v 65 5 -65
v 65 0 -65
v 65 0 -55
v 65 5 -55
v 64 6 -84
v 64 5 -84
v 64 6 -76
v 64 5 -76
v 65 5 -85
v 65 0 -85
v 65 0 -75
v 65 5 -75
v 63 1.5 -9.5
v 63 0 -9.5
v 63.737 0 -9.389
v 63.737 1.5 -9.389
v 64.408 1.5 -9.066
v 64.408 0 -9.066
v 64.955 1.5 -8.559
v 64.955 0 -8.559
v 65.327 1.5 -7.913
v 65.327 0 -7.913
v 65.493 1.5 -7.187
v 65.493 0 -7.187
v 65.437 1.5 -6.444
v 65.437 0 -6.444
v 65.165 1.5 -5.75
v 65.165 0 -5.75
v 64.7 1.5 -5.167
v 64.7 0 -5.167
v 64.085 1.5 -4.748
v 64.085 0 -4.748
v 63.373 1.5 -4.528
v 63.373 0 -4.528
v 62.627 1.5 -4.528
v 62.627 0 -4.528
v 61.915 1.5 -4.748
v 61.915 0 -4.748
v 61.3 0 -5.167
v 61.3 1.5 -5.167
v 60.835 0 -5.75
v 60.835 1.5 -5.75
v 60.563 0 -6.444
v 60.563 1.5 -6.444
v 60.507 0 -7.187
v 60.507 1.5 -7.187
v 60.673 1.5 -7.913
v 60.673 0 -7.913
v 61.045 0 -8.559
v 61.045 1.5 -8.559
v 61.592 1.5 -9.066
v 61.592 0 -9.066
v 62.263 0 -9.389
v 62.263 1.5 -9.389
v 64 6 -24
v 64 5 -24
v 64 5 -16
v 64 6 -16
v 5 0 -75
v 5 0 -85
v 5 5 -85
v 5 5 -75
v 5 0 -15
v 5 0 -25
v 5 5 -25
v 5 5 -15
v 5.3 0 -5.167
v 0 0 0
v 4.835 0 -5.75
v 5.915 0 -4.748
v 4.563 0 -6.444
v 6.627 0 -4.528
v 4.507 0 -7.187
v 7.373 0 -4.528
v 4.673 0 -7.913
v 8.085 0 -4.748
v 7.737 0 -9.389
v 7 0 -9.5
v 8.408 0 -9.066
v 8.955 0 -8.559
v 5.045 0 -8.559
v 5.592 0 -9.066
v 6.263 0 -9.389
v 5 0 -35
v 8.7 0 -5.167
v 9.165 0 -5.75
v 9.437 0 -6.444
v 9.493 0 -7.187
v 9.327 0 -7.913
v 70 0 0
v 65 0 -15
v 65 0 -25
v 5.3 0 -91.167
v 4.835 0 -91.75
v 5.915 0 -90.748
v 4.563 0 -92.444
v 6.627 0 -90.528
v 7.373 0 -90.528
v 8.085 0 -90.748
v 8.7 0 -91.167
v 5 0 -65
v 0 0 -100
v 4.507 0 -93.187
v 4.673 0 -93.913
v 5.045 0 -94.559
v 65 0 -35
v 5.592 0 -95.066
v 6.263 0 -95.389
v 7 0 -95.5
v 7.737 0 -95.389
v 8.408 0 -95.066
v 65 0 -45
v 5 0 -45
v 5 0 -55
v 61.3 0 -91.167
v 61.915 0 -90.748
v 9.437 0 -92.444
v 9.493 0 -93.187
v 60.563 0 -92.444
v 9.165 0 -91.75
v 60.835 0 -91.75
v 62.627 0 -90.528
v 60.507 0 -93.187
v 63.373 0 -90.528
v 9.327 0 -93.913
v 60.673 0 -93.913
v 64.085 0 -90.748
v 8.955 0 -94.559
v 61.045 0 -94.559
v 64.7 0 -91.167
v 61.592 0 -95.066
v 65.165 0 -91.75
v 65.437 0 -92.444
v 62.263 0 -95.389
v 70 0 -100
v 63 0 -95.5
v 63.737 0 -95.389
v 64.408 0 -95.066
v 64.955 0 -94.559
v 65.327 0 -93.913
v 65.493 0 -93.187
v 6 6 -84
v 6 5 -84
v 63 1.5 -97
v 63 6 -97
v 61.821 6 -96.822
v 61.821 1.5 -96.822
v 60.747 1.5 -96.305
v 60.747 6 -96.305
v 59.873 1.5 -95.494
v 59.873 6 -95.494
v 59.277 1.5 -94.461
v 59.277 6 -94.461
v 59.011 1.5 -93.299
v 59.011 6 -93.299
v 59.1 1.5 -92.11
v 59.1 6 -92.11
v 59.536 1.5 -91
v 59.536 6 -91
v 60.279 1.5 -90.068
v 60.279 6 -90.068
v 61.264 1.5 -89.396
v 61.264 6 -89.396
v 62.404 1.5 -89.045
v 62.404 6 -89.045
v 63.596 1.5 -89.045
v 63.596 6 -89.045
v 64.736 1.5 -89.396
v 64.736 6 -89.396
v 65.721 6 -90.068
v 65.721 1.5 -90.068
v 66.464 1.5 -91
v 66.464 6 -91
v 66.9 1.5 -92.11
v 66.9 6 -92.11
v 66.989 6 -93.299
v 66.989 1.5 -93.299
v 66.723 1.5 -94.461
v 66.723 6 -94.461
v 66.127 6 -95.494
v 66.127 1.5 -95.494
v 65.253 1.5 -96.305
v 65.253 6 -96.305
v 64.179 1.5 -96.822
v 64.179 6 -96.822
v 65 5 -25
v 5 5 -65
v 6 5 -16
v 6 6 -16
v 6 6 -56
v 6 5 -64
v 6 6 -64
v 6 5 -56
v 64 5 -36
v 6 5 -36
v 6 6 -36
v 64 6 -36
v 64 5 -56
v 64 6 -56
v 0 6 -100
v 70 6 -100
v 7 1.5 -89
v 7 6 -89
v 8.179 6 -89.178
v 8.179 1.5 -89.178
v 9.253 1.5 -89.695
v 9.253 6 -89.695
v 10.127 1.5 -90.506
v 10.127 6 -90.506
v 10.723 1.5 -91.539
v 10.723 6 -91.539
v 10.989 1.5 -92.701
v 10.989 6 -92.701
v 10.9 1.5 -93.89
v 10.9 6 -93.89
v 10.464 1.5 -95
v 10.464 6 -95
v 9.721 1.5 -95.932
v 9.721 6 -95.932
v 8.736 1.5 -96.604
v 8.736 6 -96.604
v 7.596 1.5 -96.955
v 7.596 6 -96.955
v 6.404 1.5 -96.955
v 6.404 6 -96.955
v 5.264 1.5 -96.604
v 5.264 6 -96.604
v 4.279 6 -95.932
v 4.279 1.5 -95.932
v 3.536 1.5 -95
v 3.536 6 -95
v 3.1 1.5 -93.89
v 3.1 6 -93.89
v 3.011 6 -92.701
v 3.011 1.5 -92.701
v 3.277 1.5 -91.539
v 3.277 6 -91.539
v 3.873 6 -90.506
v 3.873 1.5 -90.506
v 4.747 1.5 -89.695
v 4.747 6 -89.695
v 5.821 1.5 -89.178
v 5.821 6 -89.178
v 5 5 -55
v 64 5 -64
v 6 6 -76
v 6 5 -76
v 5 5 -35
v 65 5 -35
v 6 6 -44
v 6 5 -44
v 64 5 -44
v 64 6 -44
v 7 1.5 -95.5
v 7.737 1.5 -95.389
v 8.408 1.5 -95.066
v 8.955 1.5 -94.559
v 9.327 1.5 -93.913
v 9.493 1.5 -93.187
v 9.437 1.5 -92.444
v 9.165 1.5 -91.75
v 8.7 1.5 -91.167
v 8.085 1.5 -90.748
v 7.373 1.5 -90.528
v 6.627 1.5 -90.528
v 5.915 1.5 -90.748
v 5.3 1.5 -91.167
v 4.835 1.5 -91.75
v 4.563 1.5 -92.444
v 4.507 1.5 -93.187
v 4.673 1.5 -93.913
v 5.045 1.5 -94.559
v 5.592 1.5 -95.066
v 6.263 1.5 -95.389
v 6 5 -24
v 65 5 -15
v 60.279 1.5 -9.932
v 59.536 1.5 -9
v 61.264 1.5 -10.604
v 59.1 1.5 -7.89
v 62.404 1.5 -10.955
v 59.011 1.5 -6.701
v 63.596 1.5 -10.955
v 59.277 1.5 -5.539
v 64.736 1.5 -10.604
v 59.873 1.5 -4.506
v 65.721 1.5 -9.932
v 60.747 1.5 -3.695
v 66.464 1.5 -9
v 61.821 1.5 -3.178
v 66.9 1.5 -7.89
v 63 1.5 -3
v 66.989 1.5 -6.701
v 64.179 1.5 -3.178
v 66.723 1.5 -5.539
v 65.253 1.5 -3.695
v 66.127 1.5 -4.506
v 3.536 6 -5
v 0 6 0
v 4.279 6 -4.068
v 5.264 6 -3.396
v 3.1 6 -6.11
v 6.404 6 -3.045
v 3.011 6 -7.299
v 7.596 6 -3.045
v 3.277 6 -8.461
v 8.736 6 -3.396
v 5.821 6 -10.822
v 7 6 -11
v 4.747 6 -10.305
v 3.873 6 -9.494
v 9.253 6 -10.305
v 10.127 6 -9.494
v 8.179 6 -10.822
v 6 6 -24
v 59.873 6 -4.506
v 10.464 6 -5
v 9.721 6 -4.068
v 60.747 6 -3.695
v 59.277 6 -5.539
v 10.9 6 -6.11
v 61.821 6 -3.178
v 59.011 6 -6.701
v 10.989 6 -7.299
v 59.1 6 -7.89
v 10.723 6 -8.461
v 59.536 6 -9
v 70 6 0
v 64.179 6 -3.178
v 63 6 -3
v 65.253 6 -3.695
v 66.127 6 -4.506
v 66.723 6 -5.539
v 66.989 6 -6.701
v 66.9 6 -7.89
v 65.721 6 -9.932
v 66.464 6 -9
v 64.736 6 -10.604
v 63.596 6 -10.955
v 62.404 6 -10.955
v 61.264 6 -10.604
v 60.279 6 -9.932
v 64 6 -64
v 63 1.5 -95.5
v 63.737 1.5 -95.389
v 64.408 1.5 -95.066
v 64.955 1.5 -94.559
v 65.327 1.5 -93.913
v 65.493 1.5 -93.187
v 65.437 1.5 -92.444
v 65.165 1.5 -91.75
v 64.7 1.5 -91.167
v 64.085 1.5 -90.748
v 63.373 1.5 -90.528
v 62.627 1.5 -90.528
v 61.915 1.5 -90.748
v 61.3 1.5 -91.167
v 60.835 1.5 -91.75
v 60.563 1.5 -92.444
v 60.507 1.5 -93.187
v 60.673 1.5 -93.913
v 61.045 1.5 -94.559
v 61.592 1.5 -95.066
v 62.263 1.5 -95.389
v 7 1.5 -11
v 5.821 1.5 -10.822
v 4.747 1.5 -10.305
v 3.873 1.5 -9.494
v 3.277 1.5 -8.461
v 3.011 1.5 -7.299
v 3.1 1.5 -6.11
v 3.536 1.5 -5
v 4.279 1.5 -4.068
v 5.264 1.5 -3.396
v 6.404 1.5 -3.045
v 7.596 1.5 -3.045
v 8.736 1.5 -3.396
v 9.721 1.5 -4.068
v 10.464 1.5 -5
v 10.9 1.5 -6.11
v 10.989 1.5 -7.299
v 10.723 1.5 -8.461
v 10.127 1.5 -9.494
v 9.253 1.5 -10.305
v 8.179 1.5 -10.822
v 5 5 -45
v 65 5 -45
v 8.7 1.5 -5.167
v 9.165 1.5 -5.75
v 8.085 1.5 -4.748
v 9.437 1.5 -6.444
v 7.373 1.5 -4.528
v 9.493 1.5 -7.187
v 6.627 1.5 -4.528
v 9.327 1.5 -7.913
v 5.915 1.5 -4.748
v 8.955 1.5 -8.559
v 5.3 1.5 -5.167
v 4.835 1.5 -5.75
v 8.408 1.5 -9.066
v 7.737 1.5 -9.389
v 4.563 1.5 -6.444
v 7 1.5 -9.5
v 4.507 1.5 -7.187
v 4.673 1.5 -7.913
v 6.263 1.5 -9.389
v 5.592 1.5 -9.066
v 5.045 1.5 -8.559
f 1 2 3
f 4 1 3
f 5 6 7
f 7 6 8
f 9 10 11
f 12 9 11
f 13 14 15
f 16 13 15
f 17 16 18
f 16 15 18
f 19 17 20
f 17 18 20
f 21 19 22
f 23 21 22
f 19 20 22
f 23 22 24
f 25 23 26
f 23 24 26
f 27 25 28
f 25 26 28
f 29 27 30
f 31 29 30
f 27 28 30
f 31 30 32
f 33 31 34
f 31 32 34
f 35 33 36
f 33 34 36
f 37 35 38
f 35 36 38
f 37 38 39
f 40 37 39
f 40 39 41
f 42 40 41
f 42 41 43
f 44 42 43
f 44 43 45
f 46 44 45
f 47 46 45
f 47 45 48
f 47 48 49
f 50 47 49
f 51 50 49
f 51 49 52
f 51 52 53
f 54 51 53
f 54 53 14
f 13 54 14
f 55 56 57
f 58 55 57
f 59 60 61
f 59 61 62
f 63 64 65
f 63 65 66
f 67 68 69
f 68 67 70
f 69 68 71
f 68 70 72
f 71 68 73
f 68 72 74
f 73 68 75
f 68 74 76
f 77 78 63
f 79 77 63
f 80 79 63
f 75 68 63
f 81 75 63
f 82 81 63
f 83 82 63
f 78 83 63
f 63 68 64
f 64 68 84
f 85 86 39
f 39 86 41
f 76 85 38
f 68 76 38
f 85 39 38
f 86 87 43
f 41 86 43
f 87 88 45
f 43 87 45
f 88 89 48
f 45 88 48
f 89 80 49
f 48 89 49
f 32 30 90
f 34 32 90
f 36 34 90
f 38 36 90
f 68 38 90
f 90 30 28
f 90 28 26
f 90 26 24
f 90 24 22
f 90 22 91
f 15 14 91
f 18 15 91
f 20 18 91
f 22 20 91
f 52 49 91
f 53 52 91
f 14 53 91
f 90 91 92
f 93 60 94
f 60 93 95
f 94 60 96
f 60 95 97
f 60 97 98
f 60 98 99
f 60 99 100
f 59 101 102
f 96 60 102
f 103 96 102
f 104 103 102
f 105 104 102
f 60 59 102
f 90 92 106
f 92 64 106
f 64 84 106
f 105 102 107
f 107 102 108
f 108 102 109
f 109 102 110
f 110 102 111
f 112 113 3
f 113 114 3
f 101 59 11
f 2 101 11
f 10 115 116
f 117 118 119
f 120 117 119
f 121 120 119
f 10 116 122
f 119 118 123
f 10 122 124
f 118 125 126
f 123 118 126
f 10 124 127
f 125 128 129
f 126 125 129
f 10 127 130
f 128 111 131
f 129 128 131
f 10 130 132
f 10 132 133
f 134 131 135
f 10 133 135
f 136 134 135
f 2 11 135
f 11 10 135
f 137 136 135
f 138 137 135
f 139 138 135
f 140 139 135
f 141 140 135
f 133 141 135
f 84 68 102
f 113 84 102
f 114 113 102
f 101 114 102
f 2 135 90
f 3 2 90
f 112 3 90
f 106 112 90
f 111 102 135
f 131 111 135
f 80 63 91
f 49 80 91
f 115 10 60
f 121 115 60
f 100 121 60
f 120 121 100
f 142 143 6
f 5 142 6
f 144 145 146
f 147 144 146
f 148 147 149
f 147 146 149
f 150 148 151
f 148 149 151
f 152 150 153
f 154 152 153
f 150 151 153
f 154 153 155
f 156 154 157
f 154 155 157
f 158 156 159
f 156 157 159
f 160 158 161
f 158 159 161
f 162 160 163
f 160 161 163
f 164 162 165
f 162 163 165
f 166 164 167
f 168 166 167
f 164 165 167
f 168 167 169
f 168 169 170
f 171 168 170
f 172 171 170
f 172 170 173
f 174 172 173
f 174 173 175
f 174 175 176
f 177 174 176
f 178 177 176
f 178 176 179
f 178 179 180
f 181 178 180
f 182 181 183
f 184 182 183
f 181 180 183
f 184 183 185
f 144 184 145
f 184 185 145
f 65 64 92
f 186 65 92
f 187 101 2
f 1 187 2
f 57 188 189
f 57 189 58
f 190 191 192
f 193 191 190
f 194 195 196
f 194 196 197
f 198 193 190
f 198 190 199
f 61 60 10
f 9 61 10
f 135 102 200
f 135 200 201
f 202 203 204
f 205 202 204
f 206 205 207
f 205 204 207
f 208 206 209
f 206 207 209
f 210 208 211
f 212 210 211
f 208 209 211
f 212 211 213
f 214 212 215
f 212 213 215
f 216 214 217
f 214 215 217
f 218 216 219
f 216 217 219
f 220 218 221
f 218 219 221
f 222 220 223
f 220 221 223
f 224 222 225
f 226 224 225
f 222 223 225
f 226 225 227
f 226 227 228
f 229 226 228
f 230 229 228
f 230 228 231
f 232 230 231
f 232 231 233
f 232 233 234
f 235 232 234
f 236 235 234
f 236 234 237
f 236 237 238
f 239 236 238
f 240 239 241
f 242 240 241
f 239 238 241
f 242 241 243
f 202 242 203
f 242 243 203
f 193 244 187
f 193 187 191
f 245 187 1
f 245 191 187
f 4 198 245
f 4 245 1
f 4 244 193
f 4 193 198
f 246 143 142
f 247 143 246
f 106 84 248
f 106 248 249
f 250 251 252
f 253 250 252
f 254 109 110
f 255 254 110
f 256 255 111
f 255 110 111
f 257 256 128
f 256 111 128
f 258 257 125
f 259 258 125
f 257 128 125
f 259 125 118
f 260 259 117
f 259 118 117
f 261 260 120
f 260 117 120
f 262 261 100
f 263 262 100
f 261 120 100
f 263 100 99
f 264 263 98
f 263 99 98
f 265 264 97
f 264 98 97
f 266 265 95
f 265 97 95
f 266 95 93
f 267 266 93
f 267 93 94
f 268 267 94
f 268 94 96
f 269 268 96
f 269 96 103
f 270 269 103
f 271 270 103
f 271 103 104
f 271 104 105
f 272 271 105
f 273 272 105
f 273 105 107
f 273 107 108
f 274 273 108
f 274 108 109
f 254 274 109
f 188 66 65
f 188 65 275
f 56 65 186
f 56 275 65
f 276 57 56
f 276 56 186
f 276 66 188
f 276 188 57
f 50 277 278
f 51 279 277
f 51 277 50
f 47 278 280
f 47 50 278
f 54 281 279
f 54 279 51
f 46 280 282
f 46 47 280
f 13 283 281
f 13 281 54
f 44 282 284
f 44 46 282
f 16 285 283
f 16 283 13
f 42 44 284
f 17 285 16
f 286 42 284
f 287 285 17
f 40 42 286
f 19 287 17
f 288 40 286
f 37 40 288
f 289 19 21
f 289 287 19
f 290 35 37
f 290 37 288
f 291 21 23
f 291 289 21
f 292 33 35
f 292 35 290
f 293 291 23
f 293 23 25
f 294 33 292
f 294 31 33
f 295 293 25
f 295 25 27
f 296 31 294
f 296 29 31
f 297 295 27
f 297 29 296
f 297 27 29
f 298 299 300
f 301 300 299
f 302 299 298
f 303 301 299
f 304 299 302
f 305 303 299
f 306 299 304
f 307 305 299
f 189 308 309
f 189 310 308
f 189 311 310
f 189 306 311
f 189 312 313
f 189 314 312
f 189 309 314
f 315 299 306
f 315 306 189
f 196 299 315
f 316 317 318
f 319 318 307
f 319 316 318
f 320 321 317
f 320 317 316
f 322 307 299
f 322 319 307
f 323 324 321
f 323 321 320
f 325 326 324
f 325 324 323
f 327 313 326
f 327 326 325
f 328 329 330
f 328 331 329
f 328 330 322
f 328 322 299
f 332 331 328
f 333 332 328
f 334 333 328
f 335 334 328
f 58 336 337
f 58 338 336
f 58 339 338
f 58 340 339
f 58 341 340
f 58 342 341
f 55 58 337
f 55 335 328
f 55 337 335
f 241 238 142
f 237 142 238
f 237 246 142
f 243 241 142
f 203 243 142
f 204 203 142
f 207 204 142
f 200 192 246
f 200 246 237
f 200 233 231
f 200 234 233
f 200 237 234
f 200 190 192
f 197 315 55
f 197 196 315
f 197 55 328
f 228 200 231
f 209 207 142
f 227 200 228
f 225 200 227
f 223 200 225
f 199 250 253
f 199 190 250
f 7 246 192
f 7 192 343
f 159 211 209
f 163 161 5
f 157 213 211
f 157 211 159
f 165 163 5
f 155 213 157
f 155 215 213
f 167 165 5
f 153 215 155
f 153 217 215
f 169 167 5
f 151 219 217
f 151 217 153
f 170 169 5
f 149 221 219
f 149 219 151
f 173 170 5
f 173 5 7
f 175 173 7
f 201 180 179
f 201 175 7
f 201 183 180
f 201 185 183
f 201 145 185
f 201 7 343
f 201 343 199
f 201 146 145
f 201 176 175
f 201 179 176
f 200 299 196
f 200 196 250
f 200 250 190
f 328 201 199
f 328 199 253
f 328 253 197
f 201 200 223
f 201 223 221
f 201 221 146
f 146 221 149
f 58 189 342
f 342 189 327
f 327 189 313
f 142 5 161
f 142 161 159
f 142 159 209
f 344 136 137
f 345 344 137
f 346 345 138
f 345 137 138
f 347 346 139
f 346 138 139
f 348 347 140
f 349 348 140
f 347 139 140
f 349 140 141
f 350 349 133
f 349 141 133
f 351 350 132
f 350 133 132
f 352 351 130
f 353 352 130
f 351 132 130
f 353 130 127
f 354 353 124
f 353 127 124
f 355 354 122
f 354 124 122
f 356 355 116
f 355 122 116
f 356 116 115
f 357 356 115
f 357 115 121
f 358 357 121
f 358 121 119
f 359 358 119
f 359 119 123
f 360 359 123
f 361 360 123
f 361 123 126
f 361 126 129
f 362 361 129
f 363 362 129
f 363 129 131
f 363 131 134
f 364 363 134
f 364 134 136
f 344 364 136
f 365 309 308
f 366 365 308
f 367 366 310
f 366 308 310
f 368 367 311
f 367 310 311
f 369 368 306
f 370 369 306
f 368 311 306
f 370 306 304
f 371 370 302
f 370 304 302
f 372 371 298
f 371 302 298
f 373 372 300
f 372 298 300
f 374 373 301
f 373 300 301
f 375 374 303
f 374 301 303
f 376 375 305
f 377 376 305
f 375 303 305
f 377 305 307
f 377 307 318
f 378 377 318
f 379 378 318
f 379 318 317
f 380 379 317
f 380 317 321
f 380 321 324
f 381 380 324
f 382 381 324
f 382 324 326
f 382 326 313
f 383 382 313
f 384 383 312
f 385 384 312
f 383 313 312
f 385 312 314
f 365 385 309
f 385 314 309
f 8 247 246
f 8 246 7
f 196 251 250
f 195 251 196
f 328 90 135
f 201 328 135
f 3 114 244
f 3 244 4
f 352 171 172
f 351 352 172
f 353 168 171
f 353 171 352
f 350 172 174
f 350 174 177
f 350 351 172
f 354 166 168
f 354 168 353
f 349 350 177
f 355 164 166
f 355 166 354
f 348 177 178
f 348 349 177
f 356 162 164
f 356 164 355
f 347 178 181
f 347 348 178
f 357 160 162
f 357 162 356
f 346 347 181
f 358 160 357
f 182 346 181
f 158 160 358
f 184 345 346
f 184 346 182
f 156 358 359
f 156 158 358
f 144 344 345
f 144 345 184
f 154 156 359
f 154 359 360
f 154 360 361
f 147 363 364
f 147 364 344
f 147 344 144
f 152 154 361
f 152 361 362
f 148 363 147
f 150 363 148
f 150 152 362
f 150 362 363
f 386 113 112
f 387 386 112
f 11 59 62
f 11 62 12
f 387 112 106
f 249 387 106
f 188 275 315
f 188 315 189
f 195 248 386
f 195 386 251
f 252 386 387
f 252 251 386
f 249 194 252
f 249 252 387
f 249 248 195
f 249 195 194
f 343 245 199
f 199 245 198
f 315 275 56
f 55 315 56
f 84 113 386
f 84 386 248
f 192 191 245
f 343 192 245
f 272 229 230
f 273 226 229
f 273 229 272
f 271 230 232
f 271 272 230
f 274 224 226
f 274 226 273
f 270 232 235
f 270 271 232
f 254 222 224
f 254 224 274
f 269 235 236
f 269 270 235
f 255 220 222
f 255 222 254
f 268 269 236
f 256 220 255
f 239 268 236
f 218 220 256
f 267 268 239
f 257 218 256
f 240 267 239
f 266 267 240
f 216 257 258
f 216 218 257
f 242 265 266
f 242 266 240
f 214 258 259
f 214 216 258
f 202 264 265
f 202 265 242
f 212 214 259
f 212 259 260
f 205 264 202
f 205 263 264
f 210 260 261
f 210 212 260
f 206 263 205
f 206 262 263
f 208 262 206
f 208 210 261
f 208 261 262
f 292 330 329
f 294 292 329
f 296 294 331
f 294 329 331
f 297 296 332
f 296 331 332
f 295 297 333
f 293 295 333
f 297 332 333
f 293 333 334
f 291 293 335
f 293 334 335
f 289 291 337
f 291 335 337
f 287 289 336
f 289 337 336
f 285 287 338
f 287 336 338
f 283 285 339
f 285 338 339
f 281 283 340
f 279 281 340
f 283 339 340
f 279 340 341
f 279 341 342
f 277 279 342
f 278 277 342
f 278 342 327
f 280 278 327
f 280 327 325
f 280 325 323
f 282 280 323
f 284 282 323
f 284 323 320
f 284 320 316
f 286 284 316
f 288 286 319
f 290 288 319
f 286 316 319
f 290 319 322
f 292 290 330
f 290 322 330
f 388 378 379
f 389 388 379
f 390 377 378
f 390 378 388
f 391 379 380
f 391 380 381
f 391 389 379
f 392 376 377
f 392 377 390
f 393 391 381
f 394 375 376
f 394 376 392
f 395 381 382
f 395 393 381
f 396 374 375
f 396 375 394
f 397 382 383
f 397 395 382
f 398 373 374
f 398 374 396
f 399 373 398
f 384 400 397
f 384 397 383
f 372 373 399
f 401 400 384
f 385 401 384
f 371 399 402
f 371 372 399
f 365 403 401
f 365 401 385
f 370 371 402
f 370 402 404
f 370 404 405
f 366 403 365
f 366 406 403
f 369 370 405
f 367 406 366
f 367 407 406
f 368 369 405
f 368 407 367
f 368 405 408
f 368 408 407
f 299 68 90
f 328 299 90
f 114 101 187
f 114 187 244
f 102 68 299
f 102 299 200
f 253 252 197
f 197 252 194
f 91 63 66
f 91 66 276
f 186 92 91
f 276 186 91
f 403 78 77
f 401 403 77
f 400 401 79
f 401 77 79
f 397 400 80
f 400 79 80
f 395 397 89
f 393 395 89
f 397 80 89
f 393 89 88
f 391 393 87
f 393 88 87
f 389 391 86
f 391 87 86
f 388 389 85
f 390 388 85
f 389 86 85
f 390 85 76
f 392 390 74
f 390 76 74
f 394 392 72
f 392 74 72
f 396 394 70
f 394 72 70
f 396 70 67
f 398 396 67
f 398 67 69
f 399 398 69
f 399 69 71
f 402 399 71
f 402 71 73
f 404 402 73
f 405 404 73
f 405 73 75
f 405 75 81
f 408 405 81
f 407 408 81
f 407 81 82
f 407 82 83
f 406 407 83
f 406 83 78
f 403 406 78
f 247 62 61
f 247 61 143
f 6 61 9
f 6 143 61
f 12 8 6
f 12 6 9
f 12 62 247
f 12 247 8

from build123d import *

# Parameters (mm, degrees)
SKETCH1_W           = 70
SKETCH1_H           = 100
BOSS_EXTRUDE1_DEPTH = 6
SKETCH3_W           = 60
SKETCH3_H           = 10
CUT_EXTRUDE1_DEPTH  = 5
SKETCH4_W           = 58
SKETCH4_H           = 8
CUT_EXTRUDE2_DEPTH  = 1
SKETCH5_R           = 2.5
CUT_EXTRUDE3_DEPTH  = 10
SKETCH6_R           = 4
CUT_EXTRUDE4_DEPTH  = 4.5


with BuildPart() as part:
    # Sketch1 → Boss-Extrude1 (new body)
    with BuildSketch(Plane(origin=(0, 0, 0), x_dir=(1, 0, 0), z_dir=(0, 1, 0))):
        with Locations((35, 50)):
            Rectangle(SKETCH1_W, SKETCH1_H)
    extrude(amount=BOSS_EXTRUDE1_DEPTH)

    # Sketch3 → Cut-Extrude1 (cut)
    with BuildSketch(Plane.XZ):
        with Locations((35, -20)):
            Rectangle(SKETCH3_W, SKETCH3_H)
        with Locations((35, -40)):
            Rectangle(SKETCH3_W, SKETCH3_H)
        with Locations((35, -60)):
            Rectangle(SKETCH3_W, SKETCH3_H)
        with Locations((35, -80)):
            Rectangle(SKETCH3_W, SKETCH3_H)
    extrude(amount=-CUT_EXTRUDE1_DEPTH, mode=Mode.SUBTRACT)

    # Sketch4 → Cut-Extrude2 (cut)
    with BuildSketch(Plane.XZ.offset(-5)):
        with Locations((35, -20)):
            Rectangle(SKETCH4_W, SKETCH4_H)
        with Locations((35, -40)):
            Rectangle(SKETCH4_W, SKETCH4_H)
        with Locations((35, -60)):
            Rectangle(SKETCH4_W, SKETCH4_H)
        with Locations((35, -80)):
            Rectangle(SKETCH4_W, SKETCH4_H)
    extrude(amount=-CUT_EXTRUDE2_DEPTH, mode=Mode.SUBTRACT)

    # Sketch5 → Cut-Extrude3 (cut)
    with BuildSketch(Plane.XZ):
        with Locations(Location((63, -7, 0), (0, 0, 270))):
            Circle(SKETCH5_R)
        with Locations(Location((7, -7, 0), (0, 0, 270))):
            Circle(SKETCH5_R)
        with Locations(Location((63, -93, 0), (0, 0, 270))):
            Circle(SKETCH5_R)
        with Locations(Location((7, -93, 0), (0, 0, 270))):
            Circle(SKETCH5_R)
    extrude(amount=-CUT_EXTRUDE3_DEPTH, mode=Mode.SUBTRACT)

    # Sketch6 → Cut-Extrude4 (cut)
    with BuildSketch(Plane(origin=(0, 6, 0), x_dir=(1, 0, 0), z_dir=(0, 1, 0))):
        with Locations(Location((7, 93, 0), (0, 0, 270))):
            Circle(SKETCH6_R)
        with Locations(Location((63, 93, 0), (0, 0, 90))):
            Circle(SKETCH6_R)
        with Locations(Location((63, 7, 0), (0, 0, 270))):
            Circle(SKETCH6_R)
        with Locations(Location((7, 7, 0), (0, 0, 90))):
            Circle(SKETCH6_R)
    extrude(amount=-CUT_EXTRUDE4_DEPTH, mode=Mode.SUBTRACT)


solid = part.part
